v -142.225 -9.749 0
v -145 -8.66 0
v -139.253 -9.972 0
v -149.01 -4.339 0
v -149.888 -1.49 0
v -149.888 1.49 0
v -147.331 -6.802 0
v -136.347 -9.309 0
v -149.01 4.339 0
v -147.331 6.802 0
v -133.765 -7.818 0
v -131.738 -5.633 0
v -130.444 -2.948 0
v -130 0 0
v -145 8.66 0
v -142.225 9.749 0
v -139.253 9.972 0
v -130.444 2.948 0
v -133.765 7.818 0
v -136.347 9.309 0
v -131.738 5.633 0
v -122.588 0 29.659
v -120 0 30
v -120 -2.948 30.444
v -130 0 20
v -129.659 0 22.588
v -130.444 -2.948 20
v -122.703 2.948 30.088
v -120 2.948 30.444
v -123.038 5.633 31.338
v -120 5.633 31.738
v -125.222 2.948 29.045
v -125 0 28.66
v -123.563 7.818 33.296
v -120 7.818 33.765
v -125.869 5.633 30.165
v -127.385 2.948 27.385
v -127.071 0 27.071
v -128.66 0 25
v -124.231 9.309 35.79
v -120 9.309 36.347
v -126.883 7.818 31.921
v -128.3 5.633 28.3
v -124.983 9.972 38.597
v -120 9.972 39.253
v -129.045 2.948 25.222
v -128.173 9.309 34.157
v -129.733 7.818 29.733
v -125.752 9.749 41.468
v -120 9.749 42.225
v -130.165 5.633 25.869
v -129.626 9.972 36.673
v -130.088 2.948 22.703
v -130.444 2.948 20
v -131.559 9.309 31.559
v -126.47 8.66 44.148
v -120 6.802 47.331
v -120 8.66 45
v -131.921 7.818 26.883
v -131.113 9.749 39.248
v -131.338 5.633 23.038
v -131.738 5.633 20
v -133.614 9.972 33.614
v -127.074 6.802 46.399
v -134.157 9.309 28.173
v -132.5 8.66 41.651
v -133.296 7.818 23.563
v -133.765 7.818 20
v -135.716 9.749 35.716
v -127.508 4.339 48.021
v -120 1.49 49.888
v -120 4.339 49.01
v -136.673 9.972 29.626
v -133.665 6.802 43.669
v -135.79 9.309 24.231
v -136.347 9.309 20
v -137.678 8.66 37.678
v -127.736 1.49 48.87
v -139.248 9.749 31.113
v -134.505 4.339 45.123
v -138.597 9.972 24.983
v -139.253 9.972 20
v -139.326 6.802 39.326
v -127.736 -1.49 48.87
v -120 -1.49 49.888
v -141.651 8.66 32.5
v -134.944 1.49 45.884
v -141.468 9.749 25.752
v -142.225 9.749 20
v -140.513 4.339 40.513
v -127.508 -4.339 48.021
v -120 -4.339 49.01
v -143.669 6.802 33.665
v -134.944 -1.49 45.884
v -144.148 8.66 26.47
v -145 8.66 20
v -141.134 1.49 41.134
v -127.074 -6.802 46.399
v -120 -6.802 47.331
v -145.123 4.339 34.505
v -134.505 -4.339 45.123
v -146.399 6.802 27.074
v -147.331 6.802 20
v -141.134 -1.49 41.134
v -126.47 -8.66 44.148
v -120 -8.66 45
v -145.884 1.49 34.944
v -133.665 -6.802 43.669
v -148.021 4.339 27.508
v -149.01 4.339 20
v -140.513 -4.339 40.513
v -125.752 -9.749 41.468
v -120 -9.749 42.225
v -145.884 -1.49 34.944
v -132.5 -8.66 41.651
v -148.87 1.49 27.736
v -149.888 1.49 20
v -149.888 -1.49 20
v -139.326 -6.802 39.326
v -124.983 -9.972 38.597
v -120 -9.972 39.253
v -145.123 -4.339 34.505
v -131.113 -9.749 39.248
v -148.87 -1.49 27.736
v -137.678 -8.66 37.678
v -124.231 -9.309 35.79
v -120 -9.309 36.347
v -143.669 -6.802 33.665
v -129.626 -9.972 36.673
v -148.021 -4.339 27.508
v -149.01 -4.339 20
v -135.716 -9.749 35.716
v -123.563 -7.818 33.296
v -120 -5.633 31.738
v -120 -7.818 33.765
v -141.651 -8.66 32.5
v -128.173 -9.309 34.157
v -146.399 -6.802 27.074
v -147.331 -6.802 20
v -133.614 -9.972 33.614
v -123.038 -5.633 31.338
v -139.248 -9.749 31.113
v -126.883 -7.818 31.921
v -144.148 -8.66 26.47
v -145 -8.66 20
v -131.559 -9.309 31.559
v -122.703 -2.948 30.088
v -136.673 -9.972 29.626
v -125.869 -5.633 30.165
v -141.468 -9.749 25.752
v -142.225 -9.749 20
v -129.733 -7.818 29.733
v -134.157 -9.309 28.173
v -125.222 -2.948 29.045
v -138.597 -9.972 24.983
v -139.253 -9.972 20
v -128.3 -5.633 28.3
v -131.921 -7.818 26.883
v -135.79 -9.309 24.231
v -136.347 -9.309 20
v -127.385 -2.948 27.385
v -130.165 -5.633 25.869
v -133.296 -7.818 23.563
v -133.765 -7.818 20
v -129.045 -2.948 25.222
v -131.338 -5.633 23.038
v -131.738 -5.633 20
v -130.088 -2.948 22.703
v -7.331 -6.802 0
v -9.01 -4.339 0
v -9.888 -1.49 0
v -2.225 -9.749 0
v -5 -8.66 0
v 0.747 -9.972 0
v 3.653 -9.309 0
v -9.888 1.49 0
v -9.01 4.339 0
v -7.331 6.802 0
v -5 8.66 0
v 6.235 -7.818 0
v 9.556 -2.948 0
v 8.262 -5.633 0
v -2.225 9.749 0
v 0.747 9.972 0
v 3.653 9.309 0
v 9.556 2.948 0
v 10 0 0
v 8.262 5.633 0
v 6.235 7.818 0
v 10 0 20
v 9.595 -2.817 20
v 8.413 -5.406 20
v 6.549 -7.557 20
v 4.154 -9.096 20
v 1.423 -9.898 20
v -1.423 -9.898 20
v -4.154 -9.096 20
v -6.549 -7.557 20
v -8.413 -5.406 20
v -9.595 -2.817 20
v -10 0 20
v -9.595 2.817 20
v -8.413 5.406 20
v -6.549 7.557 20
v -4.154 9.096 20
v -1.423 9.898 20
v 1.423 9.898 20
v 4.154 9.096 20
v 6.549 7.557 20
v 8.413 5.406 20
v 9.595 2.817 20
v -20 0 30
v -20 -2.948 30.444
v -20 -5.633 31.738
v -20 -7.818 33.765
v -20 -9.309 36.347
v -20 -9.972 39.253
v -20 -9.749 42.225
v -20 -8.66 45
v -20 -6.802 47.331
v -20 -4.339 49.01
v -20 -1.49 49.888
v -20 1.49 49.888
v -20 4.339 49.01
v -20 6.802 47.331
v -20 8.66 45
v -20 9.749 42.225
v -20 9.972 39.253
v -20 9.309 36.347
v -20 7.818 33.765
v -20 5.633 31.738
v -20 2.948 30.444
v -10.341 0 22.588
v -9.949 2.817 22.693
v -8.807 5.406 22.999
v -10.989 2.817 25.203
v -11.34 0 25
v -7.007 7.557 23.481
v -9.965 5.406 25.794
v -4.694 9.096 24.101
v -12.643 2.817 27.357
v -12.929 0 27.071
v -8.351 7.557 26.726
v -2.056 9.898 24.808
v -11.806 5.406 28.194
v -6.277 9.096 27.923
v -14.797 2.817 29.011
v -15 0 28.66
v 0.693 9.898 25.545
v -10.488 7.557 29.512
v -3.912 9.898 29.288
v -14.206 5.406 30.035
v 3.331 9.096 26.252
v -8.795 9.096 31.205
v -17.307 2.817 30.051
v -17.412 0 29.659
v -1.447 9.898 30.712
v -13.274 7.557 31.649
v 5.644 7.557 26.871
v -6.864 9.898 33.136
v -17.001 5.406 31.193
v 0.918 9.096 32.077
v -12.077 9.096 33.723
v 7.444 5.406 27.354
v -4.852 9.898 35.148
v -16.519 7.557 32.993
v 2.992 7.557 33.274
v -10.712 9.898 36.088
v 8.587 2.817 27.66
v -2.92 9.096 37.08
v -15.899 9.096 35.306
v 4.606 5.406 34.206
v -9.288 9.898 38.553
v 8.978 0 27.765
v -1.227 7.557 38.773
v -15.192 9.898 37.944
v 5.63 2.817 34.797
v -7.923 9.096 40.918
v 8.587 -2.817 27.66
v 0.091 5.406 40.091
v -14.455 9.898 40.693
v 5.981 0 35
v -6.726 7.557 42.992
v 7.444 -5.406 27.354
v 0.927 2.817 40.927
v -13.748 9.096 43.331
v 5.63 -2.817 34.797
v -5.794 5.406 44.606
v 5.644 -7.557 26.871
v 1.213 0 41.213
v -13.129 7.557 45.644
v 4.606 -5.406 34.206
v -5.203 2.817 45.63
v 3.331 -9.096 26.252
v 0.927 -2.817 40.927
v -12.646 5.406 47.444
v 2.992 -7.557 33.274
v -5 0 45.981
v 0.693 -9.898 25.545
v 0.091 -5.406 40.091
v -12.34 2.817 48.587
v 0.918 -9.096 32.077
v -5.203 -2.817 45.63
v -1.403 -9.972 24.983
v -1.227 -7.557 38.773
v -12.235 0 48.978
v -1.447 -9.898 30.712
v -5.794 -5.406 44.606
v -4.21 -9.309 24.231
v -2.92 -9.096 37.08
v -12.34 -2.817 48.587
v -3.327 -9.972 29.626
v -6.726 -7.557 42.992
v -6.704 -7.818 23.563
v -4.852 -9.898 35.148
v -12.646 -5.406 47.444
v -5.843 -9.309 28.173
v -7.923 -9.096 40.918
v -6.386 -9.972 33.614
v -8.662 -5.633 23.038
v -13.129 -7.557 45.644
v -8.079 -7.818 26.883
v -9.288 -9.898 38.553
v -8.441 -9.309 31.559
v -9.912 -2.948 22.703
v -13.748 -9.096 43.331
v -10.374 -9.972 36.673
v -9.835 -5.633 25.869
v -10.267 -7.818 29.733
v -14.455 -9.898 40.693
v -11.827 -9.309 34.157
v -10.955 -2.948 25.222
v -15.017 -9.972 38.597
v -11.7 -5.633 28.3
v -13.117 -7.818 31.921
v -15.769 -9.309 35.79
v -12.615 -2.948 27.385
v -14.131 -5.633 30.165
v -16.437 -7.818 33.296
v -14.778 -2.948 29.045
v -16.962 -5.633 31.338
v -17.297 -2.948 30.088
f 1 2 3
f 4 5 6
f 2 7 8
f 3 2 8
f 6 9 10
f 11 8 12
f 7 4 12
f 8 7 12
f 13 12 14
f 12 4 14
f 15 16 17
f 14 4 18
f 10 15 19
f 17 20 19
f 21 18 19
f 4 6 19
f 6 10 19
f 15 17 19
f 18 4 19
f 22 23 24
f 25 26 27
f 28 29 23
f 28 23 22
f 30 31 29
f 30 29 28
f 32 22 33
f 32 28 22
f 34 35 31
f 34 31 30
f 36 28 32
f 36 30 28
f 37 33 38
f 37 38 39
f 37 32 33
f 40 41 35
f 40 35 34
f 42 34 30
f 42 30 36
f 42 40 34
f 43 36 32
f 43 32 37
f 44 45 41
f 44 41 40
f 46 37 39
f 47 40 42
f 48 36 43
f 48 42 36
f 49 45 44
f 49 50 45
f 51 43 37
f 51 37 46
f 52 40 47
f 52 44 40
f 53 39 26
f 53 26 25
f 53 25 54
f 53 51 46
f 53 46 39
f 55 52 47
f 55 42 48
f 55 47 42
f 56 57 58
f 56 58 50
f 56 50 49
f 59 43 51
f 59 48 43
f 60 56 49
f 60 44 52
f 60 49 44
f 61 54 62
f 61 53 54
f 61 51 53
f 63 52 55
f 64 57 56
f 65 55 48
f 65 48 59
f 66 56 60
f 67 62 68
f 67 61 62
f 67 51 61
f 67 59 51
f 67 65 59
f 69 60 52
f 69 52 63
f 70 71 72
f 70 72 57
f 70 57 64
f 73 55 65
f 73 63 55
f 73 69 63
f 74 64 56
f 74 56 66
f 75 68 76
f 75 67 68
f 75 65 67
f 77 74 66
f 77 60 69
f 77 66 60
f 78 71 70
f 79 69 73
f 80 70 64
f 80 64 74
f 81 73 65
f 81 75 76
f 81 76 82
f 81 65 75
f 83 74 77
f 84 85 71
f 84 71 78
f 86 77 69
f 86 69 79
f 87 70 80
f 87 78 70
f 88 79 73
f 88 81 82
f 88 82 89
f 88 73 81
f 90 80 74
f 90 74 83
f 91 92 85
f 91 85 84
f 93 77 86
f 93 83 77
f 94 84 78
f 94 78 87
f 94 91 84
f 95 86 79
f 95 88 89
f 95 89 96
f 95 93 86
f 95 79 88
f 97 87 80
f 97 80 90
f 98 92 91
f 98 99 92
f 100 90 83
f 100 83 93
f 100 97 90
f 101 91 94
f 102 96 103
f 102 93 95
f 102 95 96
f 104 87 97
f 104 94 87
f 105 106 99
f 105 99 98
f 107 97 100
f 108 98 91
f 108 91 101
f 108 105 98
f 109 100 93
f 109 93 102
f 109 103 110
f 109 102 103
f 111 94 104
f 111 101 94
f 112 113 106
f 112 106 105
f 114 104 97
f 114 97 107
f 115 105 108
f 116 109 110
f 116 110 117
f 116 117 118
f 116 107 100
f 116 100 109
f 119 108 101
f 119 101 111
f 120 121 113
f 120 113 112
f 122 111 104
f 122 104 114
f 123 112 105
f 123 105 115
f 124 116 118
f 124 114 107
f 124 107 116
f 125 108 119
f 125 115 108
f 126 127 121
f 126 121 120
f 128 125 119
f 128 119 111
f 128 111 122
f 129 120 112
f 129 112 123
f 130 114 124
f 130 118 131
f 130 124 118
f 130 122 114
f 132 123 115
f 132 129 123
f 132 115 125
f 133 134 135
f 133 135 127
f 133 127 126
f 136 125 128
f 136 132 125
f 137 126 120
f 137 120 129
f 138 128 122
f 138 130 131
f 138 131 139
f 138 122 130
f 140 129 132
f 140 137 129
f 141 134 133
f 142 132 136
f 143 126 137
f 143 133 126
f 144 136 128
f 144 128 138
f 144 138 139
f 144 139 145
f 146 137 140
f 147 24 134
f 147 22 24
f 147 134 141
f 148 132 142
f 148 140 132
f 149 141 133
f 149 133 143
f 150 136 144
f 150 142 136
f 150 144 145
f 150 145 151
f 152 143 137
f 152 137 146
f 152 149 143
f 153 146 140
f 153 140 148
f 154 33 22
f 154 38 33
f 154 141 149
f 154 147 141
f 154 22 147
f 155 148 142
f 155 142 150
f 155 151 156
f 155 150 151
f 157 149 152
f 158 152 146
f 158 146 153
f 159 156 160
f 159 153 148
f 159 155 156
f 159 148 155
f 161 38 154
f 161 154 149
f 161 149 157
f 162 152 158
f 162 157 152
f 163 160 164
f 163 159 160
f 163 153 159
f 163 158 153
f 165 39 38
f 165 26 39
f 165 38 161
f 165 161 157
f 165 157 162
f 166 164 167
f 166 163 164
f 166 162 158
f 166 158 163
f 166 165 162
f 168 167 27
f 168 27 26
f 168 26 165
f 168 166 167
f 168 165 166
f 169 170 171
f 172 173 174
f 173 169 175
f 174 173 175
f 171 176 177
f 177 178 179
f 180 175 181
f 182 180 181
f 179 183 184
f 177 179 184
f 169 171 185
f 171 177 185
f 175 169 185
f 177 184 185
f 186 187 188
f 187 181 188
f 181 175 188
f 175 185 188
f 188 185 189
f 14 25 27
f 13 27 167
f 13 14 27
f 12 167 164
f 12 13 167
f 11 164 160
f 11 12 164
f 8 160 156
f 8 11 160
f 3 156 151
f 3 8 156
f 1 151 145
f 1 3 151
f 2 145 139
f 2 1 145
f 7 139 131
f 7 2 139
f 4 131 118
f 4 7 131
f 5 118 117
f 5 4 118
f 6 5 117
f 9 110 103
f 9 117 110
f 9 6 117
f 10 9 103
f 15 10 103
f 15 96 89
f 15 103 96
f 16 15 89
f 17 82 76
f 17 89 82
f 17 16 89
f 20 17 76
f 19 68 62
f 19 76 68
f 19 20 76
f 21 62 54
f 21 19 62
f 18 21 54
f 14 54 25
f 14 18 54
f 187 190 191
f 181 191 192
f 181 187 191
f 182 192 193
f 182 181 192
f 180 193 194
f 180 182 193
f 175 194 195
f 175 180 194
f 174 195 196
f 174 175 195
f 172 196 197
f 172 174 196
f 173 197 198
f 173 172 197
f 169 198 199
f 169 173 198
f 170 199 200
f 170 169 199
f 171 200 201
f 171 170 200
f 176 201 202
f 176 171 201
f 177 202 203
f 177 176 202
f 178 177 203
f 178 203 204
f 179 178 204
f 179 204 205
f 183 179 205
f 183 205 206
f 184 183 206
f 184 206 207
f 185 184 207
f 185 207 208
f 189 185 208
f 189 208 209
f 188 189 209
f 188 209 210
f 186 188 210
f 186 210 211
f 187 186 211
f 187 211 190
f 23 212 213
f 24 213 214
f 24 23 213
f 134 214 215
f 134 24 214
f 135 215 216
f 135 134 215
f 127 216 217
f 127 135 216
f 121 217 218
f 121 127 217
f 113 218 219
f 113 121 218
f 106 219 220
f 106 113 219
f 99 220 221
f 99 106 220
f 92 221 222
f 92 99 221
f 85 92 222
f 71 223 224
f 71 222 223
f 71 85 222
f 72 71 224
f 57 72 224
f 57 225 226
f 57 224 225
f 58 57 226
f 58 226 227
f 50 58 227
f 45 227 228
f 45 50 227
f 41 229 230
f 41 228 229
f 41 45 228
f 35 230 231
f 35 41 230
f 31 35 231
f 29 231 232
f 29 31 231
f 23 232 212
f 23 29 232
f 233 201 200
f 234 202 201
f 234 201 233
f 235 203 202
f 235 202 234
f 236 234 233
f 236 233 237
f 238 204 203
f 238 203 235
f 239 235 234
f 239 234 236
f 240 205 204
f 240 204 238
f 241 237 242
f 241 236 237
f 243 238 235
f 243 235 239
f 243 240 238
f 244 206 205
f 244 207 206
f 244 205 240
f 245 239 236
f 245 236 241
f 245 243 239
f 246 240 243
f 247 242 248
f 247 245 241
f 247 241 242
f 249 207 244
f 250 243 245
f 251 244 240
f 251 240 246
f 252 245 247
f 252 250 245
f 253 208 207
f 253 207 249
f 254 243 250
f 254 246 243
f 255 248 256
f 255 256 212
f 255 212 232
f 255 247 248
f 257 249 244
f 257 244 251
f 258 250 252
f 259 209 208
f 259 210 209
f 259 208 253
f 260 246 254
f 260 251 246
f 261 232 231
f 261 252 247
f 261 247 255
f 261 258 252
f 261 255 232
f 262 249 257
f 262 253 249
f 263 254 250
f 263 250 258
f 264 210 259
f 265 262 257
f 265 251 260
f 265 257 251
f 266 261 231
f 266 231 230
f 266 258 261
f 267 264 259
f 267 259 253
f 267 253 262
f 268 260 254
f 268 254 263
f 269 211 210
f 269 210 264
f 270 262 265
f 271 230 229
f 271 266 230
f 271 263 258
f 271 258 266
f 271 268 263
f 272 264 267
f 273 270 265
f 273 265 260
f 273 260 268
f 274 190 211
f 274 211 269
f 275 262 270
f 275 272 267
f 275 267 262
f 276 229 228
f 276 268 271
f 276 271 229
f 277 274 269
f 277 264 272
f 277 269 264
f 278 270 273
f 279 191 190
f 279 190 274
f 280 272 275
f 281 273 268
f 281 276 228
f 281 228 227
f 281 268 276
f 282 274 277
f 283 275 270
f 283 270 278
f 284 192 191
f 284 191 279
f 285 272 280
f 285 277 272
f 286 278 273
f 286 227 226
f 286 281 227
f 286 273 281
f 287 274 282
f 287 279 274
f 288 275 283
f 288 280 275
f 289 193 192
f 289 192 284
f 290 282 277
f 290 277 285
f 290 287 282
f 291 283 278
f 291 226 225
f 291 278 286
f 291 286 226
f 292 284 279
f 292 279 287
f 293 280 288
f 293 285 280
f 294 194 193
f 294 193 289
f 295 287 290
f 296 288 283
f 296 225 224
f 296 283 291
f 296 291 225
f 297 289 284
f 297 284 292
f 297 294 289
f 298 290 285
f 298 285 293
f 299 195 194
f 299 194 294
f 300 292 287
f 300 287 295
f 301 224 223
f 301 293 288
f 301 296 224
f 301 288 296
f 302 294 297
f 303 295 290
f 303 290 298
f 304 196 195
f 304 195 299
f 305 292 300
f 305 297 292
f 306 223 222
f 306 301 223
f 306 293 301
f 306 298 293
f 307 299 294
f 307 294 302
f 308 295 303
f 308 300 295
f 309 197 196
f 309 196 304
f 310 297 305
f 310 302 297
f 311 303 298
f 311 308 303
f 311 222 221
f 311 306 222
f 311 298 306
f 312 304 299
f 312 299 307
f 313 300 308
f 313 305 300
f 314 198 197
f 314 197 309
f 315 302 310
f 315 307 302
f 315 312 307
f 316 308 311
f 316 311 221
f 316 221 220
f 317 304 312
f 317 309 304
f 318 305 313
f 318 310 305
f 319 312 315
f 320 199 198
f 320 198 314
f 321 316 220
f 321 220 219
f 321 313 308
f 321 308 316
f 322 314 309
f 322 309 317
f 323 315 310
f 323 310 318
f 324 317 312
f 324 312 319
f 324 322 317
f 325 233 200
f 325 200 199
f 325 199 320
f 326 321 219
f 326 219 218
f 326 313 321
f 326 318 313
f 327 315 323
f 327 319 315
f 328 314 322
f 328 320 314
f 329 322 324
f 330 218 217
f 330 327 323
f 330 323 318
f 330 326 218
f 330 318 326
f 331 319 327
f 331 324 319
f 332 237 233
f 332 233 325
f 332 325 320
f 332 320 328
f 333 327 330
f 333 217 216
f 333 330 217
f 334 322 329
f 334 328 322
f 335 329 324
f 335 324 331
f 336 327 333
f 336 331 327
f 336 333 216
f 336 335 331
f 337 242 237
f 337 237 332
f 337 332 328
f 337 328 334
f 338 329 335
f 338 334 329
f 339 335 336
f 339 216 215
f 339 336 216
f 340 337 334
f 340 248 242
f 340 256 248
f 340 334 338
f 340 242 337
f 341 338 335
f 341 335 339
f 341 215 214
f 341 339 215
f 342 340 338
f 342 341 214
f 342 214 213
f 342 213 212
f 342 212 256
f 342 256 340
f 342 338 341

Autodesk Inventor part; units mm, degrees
ref_plane "YZ Plane" through (0, 0, 0) normal (1, 0, 0) x (0, 1, 0)
ref_plane "XZ Plane" through (0, 0, 0) normal (0, 1, 0) x (-1, 0, 0)
ref_plane "XY Plane" through (0, 0, 0) normal (0, 0, 1) x (1, 0, 0)
sketch "Sketch1" plane through (0, 0, 0) normal (0, 0, 1) x (1, 0, 0)
  circle A0 centre (0, 0) radius 10
  line L0 (0, 0) -> (-140, 0)
  line L1 (0, 0) -> (140, 0) construction
  circle A1 centre (-140, 0) radius 10
  dimension "d0" = 20
  dimension "d1" = 140
  dimension "d2" = 180
  dimension "d3" = 20
sketch "Sketch2" plane through (0, 0, 0) normal (0, 1, 0) x (-1, 0, 0)
  line L0 (0, 0) -> (0, 20)
  line L1 (20, 40) -> (120, 40)
  line L2 (140, 20) -> (140, 0)
  arc A0 (140, 20) -> (120, 40) centre (120, 20) ccw
  arc A1 (20, 40) -> (0, 20) centre (20, 20) ccw
  point P0 (0, 40)
  point P1 (140, 40)
  dimension "d4" = 40
  dimension "d5" = 140
  dimension "d6" = 20
sweep "Sweep1" add profiles "Sketch1" path "Sketch2" path curves L2 A0 L1 A1 contours A1
extrude "Extrusion1" add sketch "Sketch1" along normal up to surface (20 mm away) contours A0
properties part number "handle_140_20"
